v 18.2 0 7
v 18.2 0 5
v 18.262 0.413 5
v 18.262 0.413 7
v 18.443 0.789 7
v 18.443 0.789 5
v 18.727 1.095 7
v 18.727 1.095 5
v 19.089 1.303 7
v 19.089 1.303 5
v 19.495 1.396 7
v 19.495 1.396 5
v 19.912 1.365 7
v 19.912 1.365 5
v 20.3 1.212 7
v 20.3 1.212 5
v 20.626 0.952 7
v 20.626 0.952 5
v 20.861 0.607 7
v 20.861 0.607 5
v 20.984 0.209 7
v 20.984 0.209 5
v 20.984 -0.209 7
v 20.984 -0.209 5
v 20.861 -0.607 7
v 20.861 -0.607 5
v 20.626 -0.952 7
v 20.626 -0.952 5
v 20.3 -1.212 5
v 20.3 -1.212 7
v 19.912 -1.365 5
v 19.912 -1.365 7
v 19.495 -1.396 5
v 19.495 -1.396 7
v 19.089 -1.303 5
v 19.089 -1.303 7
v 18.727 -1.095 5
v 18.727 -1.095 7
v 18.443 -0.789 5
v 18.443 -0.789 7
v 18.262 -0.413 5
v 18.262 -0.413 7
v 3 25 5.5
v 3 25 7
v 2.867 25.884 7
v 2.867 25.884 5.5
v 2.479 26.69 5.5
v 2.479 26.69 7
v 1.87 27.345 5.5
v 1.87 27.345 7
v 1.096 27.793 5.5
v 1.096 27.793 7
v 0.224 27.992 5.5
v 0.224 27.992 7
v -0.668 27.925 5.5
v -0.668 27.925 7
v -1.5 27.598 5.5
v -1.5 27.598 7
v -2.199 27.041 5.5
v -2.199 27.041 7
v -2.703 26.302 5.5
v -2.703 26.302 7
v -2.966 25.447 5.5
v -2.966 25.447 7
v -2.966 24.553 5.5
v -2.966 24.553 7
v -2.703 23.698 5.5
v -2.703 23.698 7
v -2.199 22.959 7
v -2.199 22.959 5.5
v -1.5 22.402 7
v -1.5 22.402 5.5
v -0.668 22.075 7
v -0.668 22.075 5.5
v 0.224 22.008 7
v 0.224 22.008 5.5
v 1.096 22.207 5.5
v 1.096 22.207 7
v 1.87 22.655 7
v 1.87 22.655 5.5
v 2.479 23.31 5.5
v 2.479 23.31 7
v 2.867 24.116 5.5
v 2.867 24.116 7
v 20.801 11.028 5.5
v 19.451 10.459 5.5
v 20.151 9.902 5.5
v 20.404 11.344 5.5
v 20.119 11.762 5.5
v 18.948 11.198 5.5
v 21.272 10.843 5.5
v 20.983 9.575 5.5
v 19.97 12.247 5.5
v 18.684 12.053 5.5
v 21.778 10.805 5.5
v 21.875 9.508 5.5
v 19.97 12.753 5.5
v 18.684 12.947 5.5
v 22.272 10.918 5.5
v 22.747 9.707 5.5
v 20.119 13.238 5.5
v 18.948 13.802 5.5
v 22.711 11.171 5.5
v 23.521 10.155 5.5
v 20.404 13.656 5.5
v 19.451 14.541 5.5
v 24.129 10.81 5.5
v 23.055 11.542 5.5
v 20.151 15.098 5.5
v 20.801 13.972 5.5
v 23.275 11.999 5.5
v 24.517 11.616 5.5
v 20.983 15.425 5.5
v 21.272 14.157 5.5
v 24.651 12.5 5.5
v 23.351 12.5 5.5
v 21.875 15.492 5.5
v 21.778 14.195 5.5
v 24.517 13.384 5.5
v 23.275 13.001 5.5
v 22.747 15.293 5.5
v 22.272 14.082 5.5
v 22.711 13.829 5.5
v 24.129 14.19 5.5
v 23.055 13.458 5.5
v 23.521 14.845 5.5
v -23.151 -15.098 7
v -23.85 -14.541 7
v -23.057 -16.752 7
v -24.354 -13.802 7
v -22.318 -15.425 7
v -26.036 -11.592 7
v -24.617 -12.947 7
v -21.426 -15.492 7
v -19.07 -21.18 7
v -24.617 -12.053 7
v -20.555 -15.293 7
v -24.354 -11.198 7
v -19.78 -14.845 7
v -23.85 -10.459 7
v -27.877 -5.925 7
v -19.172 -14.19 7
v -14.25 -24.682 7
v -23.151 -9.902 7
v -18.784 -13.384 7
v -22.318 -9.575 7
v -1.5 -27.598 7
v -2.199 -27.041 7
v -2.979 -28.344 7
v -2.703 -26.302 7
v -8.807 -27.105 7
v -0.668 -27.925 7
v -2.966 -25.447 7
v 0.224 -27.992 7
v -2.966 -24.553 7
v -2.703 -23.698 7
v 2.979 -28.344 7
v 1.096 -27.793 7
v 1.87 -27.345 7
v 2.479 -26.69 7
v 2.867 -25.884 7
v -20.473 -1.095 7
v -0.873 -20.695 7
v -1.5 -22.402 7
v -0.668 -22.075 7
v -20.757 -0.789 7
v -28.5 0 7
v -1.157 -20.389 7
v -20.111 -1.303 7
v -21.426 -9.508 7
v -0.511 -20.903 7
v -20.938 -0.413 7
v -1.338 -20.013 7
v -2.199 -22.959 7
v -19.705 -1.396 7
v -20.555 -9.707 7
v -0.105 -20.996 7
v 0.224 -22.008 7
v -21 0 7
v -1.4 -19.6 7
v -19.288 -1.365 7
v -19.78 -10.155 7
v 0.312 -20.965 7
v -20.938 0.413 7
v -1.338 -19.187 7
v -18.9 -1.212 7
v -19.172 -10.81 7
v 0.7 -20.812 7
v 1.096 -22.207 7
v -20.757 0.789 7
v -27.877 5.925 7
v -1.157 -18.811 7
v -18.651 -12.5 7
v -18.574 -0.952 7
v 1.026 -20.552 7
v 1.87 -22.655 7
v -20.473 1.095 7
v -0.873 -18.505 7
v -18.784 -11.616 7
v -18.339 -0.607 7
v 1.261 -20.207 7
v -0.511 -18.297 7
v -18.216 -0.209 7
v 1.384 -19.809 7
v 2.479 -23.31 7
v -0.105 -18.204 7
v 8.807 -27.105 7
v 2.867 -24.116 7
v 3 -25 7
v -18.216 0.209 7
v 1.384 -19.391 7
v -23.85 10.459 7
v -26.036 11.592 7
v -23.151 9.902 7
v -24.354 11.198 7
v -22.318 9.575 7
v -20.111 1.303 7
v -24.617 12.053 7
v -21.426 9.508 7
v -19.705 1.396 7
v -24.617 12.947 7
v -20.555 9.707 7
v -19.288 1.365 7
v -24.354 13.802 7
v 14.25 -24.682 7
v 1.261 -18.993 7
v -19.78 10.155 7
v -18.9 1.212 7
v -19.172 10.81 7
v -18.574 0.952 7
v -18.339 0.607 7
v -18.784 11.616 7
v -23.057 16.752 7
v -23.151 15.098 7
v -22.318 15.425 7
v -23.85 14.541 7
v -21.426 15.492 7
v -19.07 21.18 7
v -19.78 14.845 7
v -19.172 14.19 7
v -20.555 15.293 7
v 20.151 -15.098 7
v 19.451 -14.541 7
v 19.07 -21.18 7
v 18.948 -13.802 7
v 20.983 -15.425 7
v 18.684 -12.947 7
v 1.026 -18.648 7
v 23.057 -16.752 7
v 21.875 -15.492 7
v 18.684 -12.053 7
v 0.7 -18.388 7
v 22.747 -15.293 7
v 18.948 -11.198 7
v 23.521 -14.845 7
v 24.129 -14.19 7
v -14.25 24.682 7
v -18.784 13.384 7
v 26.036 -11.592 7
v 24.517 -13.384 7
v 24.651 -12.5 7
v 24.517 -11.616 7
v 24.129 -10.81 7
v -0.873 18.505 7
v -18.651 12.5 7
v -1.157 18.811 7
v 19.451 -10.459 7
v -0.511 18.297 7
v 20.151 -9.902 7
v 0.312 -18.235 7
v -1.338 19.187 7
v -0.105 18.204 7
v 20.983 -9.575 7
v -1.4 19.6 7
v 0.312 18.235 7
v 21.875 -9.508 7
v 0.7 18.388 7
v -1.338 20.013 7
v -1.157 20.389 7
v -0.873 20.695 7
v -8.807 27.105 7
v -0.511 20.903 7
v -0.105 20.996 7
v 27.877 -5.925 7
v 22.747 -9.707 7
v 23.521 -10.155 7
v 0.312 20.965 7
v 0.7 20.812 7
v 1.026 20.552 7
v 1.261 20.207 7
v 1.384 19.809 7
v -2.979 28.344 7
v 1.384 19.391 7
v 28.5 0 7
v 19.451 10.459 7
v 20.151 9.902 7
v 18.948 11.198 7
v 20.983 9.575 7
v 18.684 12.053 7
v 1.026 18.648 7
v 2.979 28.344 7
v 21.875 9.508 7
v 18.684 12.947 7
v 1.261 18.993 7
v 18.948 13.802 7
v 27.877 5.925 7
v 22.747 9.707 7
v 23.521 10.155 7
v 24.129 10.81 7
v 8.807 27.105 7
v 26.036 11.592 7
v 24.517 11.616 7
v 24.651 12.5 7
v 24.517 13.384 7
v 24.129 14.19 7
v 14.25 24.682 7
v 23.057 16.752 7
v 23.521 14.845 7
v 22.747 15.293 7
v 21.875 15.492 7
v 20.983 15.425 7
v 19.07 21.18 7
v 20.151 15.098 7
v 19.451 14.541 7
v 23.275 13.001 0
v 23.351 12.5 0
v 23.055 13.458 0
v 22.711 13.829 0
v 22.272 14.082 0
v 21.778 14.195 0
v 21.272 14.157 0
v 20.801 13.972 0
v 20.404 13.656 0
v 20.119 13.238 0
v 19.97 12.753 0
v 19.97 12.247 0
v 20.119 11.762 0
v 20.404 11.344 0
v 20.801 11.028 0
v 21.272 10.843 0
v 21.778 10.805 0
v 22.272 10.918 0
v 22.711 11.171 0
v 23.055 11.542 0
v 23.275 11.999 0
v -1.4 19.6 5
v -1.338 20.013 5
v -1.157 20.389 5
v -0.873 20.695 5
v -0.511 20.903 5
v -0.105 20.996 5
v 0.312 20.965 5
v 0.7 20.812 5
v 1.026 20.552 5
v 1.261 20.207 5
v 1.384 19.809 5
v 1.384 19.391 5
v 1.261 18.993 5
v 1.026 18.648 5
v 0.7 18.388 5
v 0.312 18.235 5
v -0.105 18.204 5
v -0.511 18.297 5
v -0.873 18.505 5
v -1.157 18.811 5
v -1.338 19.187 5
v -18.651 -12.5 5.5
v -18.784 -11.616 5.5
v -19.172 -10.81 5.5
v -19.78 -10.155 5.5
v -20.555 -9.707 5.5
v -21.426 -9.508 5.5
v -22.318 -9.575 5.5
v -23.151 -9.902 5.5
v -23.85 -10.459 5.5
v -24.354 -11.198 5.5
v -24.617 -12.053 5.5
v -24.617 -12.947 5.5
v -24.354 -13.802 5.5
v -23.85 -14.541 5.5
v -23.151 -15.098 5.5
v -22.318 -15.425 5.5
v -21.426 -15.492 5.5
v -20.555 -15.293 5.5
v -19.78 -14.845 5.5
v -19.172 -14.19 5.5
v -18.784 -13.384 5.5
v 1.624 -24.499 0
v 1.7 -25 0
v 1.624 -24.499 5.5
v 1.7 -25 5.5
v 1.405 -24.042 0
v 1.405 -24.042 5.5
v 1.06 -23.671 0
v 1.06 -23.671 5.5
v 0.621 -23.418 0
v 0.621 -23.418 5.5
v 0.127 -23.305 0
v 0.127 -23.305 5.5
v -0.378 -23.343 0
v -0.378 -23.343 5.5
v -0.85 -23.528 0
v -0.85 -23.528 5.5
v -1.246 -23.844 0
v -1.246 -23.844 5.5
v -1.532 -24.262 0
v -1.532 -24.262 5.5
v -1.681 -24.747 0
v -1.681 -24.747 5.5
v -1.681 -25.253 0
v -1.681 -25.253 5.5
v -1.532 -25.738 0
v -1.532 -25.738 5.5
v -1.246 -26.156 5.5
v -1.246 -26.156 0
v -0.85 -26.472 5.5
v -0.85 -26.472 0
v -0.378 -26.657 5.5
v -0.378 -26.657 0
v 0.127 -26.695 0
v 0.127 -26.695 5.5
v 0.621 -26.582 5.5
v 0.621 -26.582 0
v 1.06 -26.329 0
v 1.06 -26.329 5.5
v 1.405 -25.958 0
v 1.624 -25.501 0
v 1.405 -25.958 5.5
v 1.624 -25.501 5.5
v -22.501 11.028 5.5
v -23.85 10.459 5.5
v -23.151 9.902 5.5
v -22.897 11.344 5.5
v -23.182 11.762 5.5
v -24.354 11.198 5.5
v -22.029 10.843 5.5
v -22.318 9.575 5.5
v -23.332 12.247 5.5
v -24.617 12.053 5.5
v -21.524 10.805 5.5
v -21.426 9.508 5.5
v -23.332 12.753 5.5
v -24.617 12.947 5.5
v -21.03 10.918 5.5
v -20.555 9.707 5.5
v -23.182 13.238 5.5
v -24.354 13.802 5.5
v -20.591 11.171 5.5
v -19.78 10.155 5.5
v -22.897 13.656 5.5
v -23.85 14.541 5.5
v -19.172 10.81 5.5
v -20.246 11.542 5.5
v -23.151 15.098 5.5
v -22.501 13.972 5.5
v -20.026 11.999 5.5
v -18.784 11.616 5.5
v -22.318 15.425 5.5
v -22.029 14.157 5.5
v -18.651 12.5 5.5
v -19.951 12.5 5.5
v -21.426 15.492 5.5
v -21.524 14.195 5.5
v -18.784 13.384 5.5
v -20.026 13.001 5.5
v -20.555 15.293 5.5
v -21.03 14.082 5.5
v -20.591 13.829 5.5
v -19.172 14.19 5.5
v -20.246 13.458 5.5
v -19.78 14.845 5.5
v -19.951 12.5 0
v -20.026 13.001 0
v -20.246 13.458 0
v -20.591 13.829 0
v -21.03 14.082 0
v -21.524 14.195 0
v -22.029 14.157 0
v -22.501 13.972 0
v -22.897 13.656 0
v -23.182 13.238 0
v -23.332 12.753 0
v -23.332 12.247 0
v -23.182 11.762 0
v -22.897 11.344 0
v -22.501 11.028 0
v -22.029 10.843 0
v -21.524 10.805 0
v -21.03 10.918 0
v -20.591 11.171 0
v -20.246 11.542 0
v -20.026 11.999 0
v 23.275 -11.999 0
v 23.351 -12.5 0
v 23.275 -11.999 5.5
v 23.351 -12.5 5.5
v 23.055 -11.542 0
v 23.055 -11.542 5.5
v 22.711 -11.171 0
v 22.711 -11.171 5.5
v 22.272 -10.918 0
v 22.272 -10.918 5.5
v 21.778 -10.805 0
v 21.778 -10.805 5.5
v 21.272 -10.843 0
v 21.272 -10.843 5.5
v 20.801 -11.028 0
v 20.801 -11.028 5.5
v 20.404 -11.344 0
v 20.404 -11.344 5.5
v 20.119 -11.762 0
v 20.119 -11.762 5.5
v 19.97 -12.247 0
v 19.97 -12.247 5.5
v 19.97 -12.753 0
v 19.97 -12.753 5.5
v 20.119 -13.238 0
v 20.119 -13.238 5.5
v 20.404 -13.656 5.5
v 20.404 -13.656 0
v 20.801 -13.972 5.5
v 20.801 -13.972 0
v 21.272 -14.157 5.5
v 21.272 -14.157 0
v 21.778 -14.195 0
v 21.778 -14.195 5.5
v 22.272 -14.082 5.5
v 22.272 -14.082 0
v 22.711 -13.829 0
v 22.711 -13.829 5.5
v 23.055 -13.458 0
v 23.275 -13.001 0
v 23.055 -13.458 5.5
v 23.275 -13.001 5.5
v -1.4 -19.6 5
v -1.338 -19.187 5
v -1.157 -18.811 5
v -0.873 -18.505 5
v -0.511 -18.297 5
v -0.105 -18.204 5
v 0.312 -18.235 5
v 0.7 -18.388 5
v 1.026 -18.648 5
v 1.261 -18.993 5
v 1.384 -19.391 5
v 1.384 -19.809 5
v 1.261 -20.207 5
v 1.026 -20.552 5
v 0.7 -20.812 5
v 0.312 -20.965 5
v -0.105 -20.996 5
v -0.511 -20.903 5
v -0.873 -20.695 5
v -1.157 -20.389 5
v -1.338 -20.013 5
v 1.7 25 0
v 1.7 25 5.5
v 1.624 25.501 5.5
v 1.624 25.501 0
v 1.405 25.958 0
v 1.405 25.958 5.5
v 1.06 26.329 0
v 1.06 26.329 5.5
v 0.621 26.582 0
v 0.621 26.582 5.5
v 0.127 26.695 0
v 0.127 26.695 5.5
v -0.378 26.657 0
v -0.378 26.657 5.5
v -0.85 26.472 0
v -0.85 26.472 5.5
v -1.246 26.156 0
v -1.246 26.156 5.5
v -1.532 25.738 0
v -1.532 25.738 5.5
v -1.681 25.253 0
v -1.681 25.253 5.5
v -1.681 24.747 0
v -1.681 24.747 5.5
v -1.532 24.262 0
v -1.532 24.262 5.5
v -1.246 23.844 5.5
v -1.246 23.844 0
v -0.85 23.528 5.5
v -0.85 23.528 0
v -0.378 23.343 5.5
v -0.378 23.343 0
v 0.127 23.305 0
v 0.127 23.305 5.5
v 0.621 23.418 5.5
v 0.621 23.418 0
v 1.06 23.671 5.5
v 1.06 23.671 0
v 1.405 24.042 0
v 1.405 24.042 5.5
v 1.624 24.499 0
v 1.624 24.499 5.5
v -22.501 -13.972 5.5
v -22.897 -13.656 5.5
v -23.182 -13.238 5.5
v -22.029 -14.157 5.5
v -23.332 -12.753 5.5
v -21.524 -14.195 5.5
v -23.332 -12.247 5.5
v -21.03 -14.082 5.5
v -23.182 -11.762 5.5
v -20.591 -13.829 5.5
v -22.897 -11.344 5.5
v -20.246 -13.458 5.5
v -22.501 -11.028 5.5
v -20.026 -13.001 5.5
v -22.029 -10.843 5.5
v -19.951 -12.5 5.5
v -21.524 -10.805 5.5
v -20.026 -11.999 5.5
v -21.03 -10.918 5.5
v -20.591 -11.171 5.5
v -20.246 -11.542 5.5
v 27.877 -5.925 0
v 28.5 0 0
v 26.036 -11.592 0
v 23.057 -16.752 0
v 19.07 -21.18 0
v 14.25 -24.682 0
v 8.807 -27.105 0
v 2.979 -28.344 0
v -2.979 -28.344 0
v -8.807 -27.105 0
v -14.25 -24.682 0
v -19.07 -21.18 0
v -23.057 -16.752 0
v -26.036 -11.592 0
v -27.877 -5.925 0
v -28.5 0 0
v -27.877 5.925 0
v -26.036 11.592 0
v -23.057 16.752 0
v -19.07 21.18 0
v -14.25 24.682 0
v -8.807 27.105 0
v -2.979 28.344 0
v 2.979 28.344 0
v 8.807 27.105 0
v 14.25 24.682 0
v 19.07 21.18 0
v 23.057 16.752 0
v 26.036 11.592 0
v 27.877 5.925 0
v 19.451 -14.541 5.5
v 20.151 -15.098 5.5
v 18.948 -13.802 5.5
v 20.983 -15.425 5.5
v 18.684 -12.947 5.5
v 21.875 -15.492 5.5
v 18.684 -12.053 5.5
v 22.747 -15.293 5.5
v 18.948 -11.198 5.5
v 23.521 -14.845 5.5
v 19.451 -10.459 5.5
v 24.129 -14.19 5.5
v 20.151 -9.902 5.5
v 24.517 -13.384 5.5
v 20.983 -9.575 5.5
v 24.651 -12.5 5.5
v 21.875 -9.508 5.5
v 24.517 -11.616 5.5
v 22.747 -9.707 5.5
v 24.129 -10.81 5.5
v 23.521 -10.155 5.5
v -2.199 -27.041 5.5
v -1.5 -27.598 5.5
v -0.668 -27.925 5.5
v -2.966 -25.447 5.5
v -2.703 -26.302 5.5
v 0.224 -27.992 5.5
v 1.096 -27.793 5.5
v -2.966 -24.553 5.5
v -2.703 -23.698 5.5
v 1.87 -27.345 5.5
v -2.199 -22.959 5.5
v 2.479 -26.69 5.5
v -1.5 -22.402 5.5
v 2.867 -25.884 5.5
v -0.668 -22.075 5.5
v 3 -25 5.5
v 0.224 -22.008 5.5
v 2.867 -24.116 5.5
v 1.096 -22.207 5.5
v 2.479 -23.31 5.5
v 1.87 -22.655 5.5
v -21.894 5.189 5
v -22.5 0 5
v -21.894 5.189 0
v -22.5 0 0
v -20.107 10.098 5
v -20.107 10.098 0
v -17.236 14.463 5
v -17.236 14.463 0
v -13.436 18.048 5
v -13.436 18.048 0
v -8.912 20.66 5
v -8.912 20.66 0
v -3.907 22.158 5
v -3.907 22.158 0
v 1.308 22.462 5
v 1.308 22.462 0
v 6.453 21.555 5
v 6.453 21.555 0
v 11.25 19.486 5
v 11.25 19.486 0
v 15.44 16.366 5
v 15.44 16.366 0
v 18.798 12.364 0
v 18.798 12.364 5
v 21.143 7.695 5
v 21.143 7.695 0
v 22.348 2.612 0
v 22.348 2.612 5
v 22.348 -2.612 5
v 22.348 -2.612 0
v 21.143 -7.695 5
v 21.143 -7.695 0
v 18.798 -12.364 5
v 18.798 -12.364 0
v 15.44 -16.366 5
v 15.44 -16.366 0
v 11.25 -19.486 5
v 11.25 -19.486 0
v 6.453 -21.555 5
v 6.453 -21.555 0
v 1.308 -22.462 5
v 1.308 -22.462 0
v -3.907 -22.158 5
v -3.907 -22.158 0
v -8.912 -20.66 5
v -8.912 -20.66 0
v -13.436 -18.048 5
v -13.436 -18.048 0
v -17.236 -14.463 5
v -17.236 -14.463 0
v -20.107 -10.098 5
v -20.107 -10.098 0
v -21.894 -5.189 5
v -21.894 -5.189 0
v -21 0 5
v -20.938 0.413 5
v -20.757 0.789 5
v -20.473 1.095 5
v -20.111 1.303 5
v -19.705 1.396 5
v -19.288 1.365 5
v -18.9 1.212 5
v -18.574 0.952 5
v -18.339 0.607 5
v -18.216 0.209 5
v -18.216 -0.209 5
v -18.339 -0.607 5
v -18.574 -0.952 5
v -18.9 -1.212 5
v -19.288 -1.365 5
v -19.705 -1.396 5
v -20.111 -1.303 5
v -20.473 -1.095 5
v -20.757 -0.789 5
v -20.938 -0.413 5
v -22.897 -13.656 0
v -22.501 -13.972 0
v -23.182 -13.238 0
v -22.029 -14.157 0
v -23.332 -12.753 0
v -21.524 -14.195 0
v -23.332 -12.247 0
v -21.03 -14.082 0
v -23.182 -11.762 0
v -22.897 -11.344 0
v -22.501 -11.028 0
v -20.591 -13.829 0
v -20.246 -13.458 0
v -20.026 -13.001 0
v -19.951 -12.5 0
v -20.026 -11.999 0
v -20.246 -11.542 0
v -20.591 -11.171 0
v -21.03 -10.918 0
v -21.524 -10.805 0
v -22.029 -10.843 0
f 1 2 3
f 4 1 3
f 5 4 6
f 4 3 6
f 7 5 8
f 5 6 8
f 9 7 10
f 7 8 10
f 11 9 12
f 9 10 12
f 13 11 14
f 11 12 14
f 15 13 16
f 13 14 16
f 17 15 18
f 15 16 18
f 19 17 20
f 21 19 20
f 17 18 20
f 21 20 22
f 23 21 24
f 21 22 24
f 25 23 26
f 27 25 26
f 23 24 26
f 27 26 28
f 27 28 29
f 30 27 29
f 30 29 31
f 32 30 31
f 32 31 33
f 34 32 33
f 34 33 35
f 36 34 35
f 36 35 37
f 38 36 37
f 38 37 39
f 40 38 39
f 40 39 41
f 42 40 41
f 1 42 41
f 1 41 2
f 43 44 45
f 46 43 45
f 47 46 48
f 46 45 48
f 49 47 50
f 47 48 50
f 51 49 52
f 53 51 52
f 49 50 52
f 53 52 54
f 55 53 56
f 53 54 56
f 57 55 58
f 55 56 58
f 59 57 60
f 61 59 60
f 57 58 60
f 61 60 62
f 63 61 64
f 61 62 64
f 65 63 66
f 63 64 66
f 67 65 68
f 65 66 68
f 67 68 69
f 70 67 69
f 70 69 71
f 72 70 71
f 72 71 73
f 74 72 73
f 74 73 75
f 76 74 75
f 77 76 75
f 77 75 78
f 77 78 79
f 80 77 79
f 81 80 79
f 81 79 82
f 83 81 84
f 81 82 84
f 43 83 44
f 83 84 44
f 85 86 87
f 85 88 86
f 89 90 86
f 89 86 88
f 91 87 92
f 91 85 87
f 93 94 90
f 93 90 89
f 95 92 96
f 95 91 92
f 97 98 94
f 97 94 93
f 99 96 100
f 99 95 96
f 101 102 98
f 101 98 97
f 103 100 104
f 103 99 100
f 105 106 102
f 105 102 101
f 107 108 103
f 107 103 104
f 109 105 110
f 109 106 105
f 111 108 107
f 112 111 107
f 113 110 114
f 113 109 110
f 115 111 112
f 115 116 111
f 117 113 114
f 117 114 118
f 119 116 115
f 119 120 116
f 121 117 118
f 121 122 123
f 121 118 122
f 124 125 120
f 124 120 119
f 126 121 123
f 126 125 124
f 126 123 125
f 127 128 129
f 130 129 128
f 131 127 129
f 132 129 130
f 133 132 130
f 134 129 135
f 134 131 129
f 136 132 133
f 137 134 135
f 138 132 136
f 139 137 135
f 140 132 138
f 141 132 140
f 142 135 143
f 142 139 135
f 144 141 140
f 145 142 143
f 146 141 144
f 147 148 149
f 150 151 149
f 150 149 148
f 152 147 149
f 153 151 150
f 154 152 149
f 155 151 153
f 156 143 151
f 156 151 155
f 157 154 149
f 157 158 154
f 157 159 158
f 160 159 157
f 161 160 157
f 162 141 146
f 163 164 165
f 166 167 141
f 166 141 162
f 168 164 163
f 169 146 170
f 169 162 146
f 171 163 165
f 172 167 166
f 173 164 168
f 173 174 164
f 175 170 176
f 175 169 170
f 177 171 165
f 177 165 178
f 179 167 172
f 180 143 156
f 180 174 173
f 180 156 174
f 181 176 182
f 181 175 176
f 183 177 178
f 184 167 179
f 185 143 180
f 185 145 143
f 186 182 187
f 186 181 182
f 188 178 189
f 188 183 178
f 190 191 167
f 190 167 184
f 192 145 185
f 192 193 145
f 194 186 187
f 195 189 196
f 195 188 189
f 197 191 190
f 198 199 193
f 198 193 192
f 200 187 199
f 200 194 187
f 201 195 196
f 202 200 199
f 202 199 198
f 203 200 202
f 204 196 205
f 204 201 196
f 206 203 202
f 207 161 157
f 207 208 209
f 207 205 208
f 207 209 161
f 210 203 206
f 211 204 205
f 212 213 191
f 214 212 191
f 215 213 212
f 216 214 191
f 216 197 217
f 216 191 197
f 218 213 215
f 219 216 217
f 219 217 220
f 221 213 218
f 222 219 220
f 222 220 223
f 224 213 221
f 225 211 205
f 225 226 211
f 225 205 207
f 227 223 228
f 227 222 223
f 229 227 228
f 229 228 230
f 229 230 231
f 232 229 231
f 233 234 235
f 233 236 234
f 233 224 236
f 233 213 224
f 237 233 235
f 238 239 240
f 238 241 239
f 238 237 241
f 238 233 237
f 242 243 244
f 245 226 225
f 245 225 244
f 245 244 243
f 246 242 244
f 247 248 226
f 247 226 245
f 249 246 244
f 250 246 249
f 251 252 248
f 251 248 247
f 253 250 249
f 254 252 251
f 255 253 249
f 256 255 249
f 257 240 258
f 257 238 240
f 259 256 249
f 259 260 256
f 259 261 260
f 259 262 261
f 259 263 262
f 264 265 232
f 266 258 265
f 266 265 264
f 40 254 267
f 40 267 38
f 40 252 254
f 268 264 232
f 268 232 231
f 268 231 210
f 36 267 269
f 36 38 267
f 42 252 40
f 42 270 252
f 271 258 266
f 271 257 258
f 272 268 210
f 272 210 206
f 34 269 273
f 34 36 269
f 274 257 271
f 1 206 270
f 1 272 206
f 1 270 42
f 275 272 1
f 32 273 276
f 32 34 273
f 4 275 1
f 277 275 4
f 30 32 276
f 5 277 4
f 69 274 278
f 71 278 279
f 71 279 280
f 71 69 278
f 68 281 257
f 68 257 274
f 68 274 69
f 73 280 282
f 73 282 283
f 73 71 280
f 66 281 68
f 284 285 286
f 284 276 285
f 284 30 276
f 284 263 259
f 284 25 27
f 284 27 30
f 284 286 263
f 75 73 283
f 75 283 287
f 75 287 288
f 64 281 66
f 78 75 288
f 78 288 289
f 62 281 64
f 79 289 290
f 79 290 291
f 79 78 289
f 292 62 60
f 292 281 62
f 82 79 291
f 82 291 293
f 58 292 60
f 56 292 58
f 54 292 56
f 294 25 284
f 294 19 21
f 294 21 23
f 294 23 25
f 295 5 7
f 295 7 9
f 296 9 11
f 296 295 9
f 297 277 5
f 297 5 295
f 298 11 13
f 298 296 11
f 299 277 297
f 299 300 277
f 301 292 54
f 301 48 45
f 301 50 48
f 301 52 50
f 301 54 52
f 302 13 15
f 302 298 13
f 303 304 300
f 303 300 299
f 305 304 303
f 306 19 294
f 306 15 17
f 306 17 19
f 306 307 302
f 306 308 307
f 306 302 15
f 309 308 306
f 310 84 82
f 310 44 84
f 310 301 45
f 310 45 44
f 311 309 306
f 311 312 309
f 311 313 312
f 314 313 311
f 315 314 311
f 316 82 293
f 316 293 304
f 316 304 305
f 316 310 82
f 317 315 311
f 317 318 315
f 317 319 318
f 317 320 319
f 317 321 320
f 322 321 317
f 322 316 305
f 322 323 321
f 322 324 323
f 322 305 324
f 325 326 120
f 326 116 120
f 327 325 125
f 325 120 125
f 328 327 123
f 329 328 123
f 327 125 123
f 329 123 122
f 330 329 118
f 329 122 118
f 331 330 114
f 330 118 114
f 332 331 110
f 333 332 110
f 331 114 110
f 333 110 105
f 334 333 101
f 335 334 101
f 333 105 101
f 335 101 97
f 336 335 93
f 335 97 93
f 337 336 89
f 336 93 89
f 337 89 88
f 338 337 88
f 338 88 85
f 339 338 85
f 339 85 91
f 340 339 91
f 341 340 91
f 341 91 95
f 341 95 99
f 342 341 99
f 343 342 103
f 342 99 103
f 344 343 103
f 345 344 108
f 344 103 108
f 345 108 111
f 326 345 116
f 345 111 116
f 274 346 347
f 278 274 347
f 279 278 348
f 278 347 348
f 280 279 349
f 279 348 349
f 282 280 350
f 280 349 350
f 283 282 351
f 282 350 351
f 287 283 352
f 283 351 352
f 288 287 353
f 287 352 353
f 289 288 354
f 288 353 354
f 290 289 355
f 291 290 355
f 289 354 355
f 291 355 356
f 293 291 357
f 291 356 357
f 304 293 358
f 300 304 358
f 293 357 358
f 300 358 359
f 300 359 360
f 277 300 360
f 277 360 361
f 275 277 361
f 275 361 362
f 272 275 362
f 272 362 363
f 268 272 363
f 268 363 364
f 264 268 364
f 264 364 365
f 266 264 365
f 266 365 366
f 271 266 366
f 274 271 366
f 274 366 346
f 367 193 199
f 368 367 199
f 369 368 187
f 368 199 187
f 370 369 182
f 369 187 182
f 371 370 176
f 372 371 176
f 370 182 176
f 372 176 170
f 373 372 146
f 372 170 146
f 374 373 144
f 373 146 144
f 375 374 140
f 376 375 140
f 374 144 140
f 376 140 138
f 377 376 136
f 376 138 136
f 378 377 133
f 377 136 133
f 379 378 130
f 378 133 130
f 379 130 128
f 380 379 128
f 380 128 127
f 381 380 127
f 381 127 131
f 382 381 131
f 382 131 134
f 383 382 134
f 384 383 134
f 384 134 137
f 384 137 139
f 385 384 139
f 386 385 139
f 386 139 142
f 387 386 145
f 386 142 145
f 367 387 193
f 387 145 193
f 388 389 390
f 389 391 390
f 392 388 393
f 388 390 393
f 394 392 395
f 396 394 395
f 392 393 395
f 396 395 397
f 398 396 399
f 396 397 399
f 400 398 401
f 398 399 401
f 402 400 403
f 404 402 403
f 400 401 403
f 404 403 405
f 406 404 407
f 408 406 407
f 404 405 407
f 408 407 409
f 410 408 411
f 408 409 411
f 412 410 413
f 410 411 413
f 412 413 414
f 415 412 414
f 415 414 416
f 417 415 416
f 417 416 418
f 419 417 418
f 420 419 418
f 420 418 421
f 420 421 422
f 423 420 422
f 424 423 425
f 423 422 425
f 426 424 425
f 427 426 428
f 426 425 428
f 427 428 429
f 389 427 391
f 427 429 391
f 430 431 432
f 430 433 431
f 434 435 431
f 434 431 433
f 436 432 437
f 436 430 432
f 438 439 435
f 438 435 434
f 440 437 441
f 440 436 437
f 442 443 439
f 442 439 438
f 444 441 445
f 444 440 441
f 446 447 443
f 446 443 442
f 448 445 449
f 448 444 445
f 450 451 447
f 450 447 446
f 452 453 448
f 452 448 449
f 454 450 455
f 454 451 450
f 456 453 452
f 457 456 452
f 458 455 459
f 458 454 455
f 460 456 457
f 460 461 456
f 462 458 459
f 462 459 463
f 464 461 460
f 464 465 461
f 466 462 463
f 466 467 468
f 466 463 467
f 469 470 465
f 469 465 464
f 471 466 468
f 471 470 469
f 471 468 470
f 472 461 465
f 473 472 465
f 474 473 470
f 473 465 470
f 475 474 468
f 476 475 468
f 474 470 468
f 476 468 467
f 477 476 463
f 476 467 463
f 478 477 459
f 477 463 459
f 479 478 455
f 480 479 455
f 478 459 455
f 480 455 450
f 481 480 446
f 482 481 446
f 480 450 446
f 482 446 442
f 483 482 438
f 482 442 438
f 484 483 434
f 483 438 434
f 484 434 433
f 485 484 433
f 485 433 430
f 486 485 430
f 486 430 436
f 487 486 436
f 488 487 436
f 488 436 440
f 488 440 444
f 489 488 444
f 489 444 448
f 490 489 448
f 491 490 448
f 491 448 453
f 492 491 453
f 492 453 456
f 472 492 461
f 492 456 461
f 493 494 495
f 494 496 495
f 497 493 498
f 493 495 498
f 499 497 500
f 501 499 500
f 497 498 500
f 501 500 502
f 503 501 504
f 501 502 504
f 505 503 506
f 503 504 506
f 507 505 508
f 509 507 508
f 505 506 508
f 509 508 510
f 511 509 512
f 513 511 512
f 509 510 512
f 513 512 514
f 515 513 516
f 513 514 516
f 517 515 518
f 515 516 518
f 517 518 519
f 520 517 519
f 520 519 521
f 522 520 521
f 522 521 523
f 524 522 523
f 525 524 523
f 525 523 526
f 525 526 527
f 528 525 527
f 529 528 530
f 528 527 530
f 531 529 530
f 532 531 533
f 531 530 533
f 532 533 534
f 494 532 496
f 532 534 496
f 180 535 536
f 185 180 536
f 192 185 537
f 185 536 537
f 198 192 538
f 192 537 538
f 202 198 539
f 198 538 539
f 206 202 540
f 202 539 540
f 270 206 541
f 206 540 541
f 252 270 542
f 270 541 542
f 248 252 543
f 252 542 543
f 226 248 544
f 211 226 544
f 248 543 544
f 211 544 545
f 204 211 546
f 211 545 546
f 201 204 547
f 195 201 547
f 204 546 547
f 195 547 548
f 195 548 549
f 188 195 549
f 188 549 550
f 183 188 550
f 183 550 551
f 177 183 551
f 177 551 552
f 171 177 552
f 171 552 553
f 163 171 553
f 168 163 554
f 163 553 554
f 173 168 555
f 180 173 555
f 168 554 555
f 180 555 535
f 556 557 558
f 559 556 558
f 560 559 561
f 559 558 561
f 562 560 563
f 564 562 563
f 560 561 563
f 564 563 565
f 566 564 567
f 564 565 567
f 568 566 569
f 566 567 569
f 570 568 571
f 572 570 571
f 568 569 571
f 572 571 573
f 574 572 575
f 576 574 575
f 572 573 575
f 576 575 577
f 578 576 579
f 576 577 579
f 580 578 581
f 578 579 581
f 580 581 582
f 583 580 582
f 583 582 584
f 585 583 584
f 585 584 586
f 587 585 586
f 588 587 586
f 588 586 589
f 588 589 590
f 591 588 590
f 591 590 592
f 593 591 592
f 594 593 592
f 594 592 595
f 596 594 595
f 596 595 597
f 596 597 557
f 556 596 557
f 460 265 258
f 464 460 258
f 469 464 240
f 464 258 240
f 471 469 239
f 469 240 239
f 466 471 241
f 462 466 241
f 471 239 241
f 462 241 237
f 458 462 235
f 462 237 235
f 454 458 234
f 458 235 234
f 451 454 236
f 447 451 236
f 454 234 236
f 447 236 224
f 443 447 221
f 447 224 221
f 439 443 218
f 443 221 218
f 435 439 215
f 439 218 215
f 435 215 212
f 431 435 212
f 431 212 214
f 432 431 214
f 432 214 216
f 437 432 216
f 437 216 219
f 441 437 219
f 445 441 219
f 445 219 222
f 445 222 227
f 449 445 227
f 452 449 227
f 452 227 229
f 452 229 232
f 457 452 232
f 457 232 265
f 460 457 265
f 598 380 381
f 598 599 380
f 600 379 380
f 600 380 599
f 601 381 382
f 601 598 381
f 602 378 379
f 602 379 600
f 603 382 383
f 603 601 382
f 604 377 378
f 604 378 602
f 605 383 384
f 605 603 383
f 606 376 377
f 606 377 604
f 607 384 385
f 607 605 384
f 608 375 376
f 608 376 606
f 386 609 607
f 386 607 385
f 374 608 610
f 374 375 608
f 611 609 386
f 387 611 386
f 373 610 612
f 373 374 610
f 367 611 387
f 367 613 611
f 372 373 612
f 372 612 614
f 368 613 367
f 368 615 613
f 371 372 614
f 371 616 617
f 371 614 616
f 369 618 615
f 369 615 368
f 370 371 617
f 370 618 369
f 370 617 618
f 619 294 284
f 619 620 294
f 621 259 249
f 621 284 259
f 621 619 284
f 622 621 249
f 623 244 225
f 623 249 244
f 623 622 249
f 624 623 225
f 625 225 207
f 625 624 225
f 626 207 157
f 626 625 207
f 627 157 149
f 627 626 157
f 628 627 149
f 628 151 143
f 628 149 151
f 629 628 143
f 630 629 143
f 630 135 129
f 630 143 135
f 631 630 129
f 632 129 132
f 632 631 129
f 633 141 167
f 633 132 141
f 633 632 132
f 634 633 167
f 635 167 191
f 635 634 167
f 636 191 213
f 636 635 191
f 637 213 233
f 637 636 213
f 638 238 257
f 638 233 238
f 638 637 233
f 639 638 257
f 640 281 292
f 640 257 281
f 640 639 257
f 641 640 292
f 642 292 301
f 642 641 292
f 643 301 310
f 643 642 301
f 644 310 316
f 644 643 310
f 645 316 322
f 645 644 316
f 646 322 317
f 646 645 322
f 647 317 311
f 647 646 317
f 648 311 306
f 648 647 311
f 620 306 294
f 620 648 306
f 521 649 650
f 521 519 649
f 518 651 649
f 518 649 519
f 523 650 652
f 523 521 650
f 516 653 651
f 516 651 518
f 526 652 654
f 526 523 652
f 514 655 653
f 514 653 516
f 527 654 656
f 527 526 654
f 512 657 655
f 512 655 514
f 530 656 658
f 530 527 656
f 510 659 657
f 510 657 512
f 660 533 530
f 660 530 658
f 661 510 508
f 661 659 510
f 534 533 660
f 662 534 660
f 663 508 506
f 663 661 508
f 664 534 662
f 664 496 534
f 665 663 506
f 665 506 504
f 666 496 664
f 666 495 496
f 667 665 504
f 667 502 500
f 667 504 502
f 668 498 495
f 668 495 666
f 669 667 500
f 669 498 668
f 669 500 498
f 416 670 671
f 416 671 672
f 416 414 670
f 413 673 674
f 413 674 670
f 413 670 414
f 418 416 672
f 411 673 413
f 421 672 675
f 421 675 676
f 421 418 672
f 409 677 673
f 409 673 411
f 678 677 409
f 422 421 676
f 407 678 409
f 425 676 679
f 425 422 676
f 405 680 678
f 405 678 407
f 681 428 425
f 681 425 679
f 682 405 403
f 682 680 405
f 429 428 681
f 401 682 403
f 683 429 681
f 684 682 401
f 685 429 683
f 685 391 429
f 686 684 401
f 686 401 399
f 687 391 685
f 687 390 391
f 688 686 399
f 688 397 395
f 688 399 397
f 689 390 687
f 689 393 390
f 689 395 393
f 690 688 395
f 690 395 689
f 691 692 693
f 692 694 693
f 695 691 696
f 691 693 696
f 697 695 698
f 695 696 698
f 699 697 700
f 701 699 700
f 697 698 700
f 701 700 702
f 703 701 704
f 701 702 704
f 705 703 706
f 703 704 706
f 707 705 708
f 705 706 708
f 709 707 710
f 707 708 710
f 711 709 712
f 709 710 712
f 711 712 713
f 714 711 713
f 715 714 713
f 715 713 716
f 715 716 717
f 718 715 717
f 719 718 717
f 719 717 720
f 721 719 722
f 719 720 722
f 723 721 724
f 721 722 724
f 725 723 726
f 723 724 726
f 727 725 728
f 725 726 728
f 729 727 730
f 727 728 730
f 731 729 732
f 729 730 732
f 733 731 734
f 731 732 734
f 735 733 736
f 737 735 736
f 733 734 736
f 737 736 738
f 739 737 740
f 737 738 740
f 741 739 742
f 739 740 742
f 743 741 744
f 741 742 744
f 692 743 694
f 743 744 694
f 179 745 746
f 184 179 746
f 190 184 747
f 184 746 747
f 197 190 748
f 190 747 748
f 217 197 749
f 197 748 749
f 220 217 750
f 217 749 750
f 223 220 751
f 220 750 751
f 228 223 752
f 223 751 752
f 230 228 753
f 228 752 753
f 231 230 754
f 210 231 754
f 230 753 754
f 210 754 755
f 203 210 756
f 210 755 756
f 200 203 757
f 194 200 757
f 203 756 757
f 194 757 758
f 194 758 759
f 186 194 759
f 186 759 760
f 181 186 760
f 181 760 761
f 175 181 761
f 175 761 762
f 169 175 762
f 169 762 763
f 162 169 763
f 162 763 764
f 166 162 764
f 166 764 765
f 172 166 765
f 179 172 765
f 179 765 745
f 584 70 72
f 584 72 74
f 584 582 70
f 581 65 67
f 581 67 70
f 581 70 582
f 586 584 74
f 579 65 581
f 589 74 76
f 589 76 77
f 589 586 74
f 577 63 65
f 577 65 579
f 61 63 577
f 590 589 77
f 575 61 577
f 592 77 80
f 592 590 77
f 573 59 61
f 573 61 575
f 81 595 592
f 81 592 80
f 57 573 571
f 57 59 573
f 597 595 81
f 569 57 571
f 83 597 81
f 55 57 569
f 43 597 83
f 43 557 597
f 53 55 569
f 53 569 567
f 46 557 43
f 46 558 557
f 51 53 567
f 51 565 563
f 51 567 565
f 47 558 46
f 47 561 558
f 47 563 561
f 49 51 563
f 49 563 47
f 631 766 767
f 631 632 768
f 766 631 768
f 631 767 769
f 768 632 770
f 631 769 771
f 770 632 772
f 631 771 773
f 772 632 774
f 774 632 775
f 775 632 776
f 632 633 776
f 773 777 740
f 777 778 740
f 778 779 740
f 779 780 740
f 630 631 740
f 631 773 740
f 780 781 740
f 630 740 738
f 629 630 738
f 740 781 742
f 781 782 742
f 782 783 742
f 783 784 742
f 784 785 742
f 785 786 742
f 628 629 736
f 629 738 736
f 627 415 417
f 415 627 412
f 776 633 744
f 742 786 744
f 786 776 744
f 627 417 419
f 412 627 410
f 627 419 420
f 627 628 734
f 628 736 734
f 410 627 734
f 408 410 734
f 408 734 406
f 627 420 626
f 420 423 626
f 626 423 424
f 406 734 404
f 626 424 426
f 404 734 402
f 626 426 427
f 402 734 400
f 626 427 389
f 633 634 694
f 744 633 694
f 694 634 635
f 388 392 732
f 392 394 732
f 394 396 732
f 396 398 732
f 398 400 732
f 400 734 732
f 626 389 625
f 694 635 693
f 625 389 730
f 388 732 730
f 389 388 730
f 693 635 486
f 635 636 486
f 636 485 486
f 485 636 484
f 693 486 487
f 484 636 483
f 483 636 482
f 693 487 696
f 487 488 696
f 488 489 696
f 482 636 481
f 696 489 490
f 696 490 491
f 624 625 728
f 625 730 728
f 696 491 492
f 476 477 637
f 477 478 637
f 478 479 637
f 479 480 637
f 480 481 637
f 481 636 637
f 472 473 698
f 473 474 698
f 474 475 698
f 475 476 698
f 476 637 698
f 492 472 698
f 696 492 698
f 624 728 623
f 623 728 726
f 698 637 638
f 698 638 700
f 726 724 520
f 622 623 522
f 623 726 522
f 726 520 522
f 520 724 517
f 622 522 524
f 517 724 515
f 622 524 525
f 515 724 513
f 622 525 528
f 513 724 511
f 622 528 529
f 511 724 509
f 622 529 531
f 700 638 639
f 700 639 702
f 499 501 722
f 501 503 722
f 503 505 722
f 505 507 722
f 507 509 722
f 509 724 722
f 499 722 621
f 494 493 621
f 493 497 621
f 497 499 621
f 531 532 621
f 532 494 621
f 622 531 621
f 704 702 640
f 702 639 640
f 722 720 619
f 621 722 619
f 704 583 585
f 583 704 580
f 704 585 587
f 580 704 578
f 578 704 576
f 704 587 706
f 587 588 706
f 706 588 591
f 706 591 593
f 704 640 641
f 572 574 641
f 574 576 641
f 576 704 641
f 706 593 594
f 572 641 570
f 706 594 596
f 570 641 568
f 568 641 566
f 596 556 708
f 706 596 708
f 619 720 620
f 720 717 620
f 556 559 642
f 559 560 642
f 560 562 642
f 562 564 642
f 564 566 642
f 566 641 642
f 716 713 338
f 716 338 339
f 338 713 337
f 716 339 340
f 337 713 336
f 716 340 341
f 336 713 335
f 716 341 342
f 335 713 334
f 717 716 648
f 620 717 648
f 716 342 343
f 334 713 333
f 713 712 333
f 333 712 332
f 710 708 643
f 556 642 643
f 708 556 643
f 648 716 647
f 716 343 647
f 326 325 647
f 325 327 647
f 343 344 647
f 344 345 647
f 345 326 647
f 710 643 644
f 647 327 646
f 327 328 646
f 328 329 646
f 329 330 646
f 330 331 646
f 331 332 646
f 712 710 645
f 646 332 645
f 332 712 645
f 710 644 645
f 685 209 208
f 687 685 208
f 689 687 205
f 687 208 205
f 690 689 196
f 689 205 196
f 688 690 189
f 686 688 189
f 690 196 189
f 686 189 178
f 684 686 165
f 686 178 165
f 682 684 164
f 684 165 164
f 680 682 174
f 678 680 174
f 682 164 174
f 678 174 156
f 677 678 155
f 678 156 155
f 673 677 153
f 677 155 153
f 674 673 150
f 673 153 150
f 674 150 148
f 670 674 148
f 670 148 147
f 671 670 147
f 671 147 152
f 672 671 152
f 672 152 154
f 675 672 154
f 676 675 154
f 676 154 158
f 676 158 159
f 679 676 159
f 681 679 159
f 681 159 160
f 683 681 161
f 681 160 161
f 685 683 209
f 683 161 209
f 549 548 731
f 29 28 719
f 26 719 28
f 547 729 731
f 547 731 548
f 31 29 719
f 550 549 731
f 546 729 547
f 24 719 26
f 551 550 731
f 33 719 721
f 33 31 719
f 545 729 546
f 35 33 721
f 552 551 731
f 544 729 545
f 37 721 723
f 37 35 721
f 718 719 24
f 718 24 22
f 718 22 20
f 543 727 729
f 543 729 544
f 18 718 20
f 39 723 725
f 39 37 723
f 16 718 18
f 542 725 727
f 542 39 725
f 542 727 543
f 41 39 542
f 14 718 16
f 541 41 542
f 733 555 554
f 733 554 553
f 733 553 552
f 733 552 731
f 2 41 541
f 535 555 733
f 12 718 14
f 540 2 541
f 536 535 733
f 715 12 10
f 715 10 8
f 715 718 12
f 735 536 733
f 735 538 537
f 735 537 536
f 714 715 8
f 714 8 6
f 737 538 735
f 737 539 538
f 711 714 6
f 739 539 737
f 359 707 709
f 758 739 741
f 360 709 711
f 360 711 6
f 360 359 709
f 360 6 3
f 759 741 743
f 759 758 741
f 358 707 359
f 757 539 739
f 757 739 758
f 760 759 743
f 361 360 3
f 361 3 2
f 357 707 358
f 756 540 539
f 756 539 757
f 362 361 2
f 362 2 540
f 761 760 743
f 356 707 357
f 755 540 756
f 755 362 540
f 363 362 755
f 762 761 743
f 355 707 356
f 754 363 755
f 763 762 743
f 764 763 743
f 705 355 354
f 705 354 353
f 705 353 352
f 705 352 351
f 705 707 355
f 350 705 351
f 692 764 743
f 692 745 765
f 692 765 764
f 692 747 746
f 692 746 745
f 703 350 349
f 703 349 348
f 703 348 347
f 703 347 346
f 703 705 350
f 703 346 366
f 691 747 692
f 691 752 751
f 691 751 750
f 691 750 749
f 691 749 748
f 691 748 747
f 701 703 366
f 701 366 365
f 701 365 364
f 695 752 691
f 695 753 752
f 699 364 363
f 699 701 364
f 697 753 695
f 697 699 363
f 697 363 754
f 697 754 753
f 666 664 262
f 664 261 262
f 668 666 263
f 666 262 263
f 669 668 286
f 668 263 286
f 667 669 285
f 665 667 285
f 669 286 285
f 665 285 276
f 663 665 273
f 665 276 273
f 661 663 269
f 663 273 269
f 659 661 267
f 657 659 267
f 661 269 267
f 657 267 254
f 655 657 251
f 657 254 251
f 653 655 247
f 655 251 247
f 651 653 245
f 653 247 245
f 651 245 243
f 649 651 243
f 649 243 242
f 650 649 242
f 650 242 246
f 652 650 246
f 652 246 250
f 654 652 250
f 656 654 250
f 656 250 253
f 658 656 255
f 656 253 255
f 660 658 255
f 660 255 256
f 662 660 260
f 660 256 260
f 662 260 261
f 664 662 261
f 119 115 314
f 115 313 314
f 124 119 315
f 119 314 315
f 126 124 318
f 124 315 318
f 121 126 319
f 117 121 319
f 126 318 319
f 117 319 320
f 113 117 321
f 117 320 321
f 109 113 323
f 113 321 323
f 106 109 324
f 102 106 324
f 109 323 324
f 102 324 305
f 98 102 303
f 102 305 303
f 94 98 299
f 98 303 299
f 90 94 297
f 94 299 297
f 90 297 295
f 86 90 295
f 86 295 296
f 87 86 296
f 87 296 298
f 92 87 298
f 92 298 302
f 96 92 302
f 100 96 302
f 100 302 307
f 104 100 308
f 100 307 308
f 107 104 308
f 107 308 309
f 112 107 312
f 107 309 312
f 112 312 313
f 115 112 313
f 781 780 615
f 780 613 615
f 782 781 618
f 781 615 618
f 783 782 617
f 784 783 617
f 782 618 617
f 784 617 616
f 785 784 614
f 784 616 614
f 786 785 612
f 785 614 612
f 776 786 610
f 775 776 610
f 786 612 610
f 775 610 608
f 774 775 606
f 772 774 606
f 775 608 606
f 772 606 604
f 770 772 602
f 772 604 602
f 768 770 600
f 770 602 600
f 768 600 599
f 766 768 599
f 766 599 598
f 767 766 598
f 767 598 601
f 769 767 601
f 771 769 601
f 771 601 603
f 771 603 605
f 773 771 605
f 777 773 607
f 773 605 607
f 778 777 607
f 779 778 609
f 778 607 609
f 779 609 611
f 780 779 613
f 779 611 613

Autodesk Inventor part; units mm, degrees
ref_plane "YZ Plane" through (0, 0, 0) normal (1, 0, 0) x (0, 1, 0)
ref_plane "XZ Plane" through (0, 0, 0) normal (0, 1, 0) x (-1, 0, 0)
ref_plane "XY Plane" through (0, 0, 0) normal (0, 0, 1) x (1, 0, 0)
sketch "スケッチ1" plane through (0, 0, 0) normal (0, 0, 1) x (1, 0, 0)
  circle A0 centre (0, 0) radius 28.5
  circle A1 centre (0, 0) radius 20
  dimension "d0" = 57
  dimension "d1" = 40
extrude "押し出し1" add sketch "スケッチ1" along normal blind 10 contours A0 | A1
sketch "スケッチ2" plane through (0, 0, 0) normal (0, 0, -1) x (-1, 0, 0)
  circle A0 centre (0, 0) radius 22.5
  dimension "d4" = 45
extrude "押し出し2" cut sketch "スケッチ2" against normal blind 5
sketch "スケッチ3" plane through (0, 0, 5) normal (0, 0, -1) x (-1, 0, 0)
  circle A0 centre (0, 0) radius 19.6
  circle A1 centre (19.6, 0) radius 1.4
  circle A2 centre (0, 19.6) radius 1.4
  circle A3 centre (-19.6, 0) radius 1.4
  circle A4 centre (0, -19.6) radius 1.4
  dimension "d7" = 39.2
  dimension "d8" = 2.8
  dimension "d11" = 360
extrude "押し出し3" cut sketch "スケッチ3" against normal blind 5 contours A0 A1 | A0 A1 | A2 A0 | A0 A2 | A4 A0 | A0 A4 | A3 A0 | A0 A3
sketch "スケッチ4" plane through (0, 0, 10) normal (0, 0, 1) x (1, 0, 0)
  circle A0 centre (0, 0) radius 25
  circle A1 centre (0, -25) radius 1.7
  circle A2 centre (21.6506, -12.5) radius 1.7
  circle A3 centre (21.6506, 12.5) radius 1.7
  circle A4 centre (0, 25) radius 1.7
  circle A5 centre (-21.6506, 12.5) radius 1.7
  circle A6 centre (-21.6506, -12.5) radius 1.7
  dimension "d15" = 50
  dimension "d16" = 3.4
  dimension "d19" = 360
extrude "押し出し4" cut sketch "スケッチ4" against normal blind 10 contours A3 A0 | A0 A3 | A2 A0 | A0 A2 | A4 A0 | A0 A4 | A1 A0 | A0 A1 | A5 A0 | A0 A5 | A6 A0 | A0 A6
sketch "スケッチ5" plane through (0, 0, 10) normal (0, 0, 1) x (1, 0, 0)
  circle A0 centre (0, 0) radius 28.5
extrude "押し出し5" cut sketch "スケッチ5" against normal blind 3
sketch "スケッチ6" plane through (0, 0, 7) normal (0, 0, 1) x (1, 0, 0)
  circle A0 centre (0, 0) radius 21.5
  circle A1 centre (0, 25) radius 1.7 projected
  circle A2 centre (0, 25) radius 3
  circle A3 centre (-21.6506, 12.5) radius 3
  circle A4 centre (-21.6506, -12.5) radius 3
  circle A5 centre (0, -25) radius 3
  circle A6 centre (21.6506, -12.5) radius 3
  circle A7 centre (21.6506, 12.5) radius 3
  dimension "d25" = 43
  dimension "d26" = 6
  dimension "d29" = 360
extrude "押し出し6" cut sketch "スケッチ6" against normal blind 1.5 contours A1 | A2 | A3 | A4 | A5 | A6 | A7
properties part number "piper-GIM3505-8" material "ABS プラスチック"
